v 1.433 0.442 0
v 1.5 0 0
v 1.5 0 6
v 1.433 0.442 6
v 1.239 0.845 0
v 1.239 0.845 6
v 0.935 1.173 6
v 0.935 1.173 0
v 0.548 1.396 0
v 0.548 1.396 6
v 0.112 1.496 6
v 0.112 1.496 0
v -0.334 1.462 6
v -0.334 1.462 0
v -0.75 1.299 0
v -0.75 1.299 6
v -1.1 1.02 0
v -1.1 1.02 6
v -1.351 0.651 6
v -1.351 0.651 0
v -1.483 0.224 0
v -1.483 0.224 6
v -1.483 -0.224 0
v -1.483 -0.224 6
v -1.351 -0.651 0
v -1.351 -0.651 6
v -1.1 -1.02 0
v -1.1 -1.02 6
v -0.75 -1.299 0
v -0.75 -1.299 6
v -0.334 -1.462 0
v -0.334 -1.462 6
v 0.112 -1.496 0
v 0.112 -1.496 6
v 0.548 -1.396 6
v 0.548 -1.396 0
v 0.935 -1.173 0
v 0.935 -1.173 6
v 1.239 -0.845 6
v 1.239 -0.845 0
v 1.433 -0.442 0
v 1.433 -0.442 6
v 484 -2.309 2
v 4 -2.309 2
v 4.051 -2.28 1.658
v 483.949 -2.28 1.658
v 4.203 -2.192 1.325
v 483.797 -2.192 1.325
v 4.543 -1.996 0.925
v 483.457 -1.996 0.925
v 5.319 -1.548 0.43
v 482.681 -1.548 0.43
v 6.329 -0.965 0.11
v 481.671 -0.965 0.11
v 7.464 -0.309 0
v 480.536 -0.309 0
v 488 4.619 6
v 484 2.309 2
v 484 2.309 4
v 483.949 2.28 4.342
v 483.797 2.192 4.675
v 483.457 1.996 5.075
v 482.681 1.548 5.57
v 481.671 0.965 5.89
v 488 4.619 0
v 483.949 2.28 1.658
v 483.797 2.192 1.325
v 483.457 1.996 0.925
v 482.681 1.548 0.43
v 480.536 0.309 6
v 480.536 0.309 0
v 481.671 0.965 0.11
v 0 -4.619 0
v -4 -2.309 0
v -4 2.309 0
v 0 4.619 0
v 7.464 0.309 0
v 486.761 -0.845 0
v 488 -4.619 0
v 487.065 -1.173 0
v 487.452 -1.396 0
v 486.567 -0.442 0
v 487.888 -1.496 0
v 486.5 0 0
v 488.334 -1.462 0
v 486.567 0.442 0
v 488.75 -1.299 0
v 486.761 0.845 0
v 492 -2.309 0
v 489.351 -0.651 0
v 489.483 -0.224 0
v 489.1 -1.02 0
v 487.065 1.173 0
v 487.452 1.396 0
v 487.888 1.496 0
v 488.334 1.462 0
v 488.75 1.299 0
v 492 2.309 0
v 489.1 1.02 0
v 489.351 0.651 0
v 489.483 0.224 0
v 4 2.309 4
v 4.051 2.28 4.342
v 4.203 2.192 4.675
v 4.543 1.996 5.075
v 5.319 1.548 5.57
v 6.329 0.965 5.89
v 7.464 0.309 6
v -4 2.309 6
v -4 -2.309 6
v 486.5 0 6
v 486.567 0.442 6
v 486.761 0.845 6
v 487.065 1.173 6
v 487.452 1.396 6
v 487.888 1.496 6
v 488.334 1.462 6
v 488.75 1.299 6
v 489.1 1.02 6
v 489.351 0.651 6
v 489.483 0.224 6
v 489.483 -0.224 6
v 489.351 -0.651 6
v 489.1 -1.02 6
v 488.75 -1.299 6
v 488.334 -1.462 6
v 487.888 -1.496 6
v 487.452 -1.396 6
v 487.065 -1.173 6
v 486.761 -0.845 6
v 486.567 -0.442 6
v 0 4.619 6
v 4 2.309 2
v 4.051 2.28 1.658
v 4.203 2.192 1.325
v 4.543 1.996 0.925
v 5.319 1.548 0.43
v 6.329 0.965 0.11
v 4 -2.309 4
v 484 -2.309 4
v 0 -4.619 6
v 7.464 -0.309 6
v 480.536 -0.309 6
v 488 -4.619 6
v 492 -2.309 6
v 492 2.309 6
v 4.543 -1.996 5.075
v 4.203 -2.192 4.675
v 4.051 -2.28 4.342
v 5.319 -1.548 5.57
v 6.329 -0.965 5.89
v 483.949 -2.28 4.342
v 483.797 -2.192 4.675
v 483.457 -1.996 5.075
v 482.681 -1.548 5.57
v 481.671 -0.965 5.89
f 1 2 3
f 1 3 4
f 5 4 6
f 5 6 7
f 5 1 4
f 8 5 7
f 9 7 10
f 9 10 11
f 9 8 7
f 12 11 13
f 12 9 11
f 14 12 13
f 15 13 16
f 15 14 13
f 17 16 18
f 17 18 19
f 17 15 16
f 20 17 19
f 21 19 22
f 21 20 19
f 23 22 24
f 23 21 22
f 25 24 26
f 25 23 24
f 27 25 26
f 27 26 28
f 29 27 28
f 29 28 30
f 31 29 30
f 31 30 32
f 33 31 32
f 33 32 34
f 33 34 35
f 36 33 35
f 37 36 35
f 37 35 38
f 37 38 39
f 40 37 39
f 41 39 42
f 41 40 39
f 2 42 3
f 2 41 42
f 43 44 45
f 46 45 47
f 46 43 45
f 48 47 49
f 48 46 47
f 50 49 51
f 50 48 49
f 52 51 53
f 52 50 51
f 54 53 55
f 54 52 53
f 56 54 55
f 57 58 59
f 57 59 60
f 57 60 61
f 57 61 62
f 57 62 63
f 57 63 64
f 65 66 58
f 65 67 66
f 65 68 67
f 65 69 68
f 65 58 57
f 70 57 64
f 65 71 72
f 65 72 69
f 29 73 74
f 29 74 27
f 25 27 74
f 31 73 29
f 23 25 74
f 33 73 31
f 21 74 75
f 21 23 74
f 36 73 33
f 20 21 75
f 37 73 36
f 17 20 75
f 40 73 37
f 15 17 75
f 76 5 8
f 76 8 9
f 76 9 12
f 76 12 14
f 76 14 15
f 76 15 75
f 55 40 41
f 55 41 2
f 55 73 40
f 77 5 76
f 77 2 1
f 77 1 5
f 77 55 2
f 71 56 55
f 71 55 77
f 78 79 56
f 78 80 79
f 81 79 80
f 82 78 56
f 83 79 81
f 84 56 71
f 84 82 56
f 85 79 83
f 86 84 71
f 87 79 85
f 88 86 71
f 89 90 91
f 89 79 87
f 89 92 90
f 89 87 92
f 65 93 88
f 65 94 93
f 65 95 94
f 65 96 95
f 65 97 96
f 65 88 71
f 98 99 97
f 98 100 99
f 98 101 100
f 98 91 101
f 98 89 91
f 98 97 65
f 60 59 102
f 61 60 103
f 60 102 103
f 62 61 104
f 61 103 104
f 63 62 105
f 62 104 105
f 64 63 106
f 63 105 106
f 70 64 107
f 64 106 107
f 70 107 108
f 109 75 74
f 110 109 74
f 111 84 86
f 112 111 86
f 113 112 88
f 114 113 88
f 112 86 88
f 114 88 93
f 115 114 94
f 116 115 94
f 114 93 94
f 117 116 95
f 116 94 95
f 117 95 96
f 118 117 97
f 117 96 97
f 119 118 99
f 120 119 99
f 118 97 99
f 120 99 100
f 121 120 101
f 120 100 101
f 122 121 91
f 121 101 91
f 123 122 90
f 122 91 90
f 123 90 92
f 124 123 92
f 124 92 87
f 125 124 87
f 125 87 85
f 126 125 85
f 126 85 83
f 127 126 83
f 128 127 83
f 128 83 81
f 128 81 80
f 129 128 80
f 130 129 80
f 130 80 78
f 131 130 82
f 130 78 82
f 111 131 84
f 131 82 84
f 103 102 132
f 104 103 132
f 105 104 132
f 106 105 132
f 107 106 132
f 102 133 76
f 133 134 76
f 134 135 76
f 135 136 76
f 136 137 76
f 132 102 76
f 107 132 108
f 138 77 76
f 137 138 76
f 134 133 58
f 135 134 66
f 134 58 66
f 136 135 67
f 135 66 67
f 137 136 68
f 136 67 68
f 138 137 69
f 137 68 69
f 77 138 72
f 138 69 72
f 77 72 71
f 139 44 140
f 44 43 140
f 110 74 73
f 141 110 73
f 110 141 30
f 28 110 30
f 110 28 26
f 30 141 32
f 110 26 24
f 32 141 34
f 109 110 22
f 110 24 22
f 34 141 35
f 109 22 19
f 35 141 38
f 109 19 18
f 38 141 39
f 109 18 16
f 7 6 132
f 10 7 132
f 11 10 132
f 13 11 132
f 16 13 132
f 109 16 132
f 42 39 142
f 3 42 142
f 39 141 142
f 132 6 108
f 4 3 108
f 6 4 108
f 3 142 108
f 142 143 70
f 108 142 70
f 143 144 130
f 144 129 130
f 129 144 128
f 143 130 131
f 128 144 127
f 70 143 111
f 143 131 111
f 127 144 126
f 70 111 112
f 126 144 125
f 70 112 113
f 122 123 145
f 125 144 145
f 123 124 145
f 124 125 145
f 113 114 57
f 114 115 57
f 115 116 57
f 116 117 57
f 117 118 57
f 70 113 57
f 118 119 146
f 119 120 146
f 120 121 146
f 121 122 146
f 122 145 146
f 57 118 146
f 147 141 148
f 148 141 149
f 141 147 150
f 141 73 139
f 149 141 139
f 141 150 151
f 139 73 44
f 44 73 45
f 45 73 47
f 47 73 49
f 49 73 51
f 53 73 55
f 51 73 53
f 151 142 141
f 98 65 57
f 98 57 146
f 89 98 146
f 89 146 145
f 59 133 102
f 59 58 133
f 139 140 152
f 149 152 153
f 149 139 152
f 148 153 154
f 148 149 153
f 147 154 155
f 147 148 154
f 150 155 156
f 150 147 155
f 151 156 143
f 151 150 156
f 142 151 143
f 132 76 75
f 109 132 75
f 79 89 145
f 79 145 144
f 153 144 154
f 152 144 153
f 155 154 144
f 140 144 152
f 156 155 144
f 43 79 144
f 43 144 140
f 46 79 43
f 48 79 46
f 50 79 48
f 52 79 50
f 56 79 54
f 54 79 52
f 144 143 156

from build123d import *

# Parameters (mm, degrees)
F0_R     = 1.5
F1_DEPTH = 6
F2_DEPTH = 240
F4_R     = 2


with BuildPart() as f1:
    # F0 (on Top) → F1 (new body)
    with BuildSketch(Plane.XY):
        Polygon((-4, 2.3094010768), (-4, -2.3094010768), (0, -4.6188021535), (4, -2.3094010768), (4, 2.3094010768), (0, 4.6188021535), align=None)
        Circle(F0_R, mode=Mode.SUBTRACT)
    extrude(amount=F1_DEPTH)

    # F2 (add): a face of the model
    f2_faces = [f1.faces().sort_by_distance(p)[0] for p in [
        (4, 0, 3),
    ]]
    extrude(f2_faces, amount=F2_DEPTH)

    # F3: F1 across face


with BuildPart() as f1_1:
    add(f1.part)
    add(f1.part.mirror(Plane(origin=(244, 0, 3), x_dir=(0, 1, 0), z_dir=(1, 0, 0))))

    # F4
    f4_edges = [f1_1.edges().sort_by_distance(p)[0] for p in [
        (244, -2.309401, 6),
        (244, 2.309401, 6),
        (244, -2.309401, 0),
        (244, 2.309401, 0),
    ]]
    fillet(f4_edges, radius=F4_R)


solid = f1_1.part
